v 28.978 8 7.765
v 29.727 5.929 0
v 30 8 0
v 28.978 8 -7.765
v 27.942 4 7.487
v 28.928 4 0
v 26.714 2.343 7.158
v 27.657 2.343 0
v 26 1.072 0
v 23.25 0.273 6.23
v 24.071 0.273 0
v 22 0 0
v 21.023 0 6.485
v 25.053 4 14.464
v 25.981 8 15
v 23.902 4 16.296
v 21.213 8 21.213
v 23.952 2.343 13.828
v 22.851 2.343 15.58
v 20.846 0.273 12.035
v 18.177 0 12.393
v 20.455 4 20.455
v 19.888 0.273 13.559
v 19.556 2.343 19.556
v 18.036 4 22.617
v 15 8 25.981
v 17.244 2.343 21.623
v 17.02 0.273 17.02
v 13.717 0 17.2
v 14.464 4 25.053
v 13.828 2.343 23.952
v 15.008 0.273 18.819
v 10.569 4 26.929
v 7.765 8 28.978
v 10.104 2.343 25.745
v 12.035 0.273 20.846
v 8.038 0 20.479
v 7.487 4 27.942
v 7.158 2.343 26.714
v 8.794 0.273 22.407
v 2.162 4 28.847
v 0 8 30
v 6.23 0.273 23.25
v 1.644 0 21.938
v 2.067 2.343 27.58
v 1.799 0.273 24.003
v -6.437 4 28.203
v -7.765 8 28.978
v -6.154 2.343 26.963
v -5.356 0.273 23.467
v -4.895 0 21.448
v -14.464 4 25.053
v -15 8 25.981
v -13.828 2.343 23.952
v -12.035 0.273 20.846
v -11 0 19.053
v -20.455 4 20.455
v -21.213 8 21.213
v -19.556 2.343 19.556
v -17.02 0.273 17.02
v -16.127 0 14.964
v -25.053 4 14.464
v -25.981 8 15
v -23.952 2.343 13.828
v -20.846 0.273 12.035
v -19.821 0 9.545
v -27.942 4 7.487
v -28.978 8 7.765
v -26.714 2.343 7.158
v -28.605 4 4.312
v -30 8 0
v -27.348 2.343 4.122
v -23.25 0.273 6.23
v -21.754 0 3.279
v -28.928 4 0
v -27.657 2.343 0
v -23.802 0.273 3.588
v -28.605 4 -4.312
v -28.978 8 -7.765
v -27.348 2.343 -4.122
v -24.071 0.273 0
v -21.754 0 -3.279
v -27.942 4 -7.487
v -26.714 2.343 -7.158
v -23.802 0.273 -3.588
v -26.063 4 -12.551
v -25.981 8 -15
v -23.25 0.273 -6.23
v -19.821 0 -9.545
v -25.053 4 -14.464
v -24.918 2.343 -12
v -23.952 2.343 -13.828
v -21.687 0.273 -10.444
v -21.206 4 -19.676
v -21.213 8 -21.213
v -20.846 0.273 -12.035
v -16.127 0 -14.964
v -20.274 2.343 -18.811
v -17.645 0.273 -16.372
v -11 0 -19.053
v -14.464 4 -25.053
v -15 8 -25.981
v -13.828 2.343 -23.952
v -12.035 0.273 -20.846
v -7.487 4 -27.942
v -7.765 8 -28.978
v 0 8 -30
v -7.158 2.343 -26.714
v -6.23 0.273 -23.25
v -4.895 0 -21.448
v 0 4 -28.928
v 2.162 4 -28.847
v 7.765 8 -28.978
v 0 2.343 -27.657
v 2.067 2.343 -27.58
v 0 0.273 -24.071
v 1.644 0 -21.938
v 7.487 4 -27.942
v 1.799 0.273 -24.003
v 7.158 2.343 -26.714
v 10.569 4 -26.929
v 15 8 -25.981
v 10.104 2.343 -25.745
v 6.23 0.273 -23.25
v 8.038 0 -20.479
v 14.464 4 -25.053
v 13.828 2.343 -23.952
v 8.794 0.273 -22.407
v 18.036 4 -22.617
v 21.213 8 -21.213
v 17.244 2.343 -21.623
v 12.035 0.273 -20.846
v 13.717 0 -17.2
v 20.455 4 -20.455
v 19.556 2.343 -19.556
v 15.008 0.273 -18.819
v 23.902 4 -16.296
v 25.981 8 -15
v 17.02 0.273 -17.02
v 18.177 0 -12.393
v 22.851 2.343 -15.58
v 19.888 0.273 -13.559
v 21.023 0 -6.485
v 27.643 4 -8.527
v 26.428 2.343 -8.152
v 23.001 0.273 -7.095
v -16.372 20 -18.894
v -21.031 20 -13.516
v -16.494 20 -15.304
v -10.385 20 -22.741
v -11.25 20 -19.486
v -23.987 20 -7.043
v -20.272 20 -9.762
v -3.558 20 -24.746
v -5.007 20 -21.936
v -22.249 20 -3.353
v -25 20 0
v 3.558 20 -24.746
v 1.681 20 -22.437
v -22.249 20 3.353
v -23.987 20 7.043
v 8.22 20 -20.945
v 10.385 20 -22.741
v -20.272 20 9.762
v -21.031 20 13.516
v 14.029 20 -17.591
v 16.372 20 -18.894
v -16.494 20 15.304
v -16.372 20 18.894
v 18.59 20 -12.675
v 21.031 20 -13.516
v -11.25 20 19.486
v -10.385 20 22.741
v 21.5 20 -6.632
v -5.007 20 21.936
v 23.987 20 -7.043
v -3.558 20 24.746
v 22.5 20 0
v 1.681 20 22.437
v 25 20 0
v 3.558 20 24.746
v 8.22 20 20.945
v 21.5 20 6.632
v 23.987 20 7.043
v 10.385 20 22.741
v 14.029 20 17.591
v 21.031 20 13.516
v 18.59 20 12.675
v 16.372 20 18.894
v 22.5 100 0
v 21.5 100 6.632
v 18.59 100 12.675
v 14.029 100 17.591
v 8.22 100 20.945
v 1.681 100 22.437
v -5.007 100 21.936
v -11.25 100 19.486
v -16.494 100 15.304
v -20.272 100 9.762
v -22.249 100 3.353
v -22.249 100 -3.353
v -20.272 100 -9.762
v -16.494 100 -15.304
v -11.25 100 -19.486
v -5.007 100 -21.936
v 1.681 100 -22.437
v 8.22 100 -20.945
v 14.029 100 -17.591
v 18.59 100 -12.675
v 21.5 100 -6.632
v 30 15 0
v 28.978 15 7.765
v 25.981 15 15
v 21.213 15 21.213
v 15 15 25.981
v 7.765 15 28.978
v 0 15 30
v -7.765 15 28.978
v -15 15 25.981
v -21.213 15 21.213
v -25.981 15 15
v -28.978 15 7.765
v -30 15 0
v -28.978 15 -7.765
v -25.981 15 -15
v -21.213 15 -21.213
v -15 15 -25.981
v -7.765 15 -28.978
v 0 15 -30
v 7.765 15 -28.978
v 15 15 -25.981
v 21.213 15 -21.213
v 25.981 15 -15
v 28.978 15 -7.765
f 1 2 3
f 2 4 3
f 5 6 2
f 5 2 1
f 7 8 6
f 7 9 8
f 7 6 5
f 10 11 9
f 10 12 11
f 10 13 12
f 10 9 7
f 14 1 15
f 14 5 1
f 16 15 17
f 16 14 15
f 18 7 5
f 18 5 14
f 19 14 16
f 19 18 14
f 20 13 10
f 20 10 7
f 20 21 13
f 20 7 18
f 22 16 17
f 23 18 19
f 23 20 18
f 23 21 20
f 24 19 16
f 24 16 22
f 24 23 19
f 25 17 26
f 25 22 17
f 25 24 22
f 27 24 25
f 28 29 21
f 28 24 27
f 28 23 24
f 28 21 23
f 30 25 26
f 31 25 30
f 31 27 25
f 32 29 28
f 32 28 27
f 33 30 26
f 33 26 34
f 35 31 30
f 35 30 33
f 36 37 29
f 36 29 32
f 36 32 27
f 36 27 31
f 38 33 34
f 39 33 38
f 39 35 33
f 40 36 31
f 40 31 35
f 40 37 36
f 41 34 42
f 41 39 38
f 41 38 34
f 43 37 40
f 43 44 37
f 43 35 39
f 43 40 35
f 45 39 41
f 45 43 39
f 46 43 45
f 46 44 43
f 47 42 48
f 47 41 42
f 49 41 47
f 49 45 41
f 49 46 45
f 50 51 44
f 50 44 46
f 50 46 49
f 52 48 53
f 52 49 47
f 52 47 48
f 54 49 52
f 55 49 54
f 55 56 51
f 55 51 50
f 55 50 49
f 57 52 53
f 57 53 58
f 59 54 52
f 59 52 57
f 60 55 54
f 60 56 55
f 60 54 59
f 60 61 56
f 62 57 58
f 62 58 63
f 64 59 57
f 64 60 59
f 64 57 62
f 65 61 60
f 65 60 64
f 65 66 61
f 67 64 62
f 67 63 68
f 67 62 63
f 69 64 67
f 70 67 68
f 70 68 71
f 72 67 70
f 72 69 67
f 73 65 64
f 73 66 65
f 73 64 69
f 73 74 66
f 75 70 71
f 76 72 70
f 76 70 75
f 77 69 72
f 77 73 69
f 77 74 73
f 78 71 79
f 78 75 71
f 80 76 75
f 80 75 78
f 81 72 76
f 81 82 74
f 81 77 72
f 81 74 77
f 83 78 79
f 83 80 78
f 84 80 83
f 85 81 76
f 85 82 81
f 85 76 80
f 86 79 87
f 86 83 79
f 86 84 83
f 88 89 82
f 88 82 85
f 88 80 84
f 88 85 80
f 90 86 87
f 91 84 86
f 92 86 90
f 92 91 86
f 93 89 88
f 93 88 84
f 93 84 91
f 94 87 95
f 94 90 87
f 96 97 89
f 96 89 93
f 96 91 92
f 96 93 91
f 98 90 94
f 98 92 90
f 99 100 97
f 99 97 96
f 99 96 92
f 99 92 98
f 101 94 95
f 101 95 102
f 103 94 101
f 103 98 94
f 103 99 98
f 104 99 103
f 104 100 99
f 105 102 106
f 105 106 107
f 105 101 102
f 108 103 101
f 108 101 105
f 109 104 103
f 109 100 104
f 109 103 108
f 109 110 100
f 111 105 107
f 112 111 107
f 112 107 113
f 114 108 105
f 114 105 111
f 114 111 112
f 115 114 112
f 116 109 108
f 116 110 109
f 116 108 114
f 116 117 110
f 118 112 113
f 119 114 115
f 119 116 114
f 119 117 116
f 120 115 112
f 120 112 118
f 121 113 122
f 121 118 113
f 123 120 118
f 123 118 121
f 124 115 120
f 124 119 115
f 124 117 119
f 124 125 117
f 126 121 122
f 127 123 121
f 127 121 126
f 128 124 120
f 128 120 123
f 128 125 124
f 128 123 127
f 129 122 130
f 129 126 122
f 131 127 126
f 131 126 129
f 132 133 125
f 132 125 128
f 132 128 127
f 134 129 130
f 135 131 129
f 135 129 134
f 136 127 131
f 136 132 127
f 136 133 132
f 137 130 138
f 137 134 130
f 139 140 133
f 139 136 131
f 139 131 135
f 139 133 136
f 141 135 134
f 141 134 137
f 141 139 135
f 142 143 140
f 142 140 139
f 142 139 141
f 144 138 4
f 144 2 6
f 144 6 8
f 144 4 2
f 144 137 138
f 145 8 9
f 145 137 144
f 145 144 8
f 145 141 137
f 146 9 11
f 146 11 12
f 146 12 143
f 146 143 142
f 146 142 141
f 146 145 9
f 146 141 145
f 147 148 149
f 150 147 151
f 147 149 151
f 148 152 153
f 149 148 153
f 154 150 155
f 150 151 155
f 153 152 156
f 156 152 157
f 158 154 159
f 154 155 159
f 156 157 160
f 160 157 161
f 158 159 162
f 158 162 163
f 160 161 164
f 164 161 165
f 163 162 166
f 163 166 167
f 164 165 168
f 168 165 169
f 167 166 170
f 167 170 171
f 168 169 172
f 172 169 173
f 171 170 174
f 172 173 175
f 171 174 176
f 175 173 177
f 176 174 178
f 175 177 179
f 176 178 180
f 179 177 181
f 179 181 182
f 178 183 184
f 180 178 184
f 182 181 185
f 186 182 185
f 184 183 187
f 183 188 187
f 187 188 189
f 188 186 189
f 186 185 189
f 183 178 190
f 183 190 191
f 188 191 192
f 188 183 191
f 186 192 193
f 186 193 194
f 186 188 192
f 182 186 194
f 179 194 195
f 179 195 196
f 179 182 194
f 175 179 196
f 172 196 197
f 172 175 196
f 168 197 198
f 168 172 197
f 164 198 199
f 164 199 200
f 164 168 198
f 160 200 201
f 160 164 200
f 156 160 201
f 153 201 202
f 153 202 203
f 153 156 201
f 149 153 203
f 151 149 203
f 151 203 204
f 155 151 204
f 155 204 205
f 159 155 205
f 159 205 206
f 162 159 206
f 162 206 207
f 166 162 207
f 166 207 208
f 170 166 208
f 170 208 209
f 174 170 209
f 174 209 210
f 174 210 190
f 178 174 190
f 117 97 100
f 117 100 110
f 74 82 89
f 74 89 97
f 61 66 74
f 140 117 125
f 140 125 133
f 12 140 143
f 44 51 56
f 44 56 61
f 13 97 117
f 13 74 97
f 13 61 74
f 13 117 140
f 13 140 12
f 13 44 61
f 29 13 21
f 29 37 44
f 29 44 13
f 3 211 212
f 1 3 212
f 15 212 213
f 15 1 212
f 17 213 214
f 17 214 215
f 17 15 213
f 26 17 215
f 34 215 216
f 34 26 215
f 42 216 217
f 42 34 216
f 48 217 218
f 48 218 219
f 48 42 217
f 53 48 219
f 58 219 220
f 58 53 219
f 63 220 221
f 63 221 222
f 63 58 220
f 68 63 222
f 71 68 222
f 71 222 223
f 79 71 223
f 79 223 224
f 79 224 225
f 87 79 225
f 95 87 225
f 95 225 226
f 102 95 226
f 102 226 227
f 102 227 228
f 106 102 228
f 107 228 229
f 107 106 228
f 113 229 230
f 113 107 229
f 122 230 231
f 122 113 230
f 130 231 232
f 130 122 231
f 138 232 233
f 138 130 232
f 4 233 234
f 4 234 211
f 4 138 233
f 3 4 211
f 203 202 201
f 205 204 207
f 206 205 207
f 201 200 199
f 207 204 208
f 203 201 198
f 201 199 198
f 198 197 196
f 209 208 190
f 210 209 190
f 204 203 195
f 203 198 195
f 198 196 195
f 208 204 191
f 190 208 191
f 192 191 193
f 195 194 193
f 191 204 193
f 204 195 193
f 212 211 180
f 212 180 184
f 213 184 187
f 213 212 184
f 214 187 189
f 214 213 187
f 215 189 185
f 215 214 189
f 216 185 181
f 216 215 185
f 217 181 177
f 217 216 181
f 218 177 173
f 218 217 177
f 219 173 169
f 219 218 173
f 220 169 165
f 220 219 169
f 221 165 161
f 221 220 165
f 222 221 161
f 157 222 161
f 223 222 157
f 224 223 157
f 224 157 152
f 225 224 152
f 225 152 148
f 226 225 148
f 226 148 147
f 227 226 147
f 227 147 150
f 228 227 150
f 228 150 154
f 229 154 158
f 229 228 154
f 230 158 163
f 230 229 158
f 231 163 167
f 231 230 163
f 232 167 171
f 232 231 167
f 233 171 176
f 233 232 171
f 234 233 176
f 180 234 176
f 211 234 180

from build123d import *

# Parameters (mm, degrees)
F0_R     = 22.5
F0_R_2   = 30
F1_DEPTH = 20
F2_DEPTH = 100
F3_SIZE  = 5
F4_R     = 8


with BuildPart() as f1:
    # F0 (on Front) → F1 (new body)
    with BuildSketch(Plane.XZ):
        Circle(F0_R)
        Circle(F0_R_2)
        Circle(F0_R, mode=Mode.SUBTRACT)
    extrude(amount=-F1_DEPTH)

    # F0 (on Front) → F2 (join)
    with BuildSketch(Plane.XZ):
        Circle(F0_R)
    extrude(amount=-F2_DEPTH)

    # F3
    f3_edges = [f1.edges().sort_by_distance(p)[0] for p in [
        (-30, 20, 0),
    ]]
    chamfer(f3_edges, length=F3_SIZE)

    # F4
    f4_edges = [f1.edges().sort_by_distance(p)[0] for p in [
        (-30, 0, 0),
    ]]
    fillet(f4_edges, radius=F4_R)


solid = f1.part
